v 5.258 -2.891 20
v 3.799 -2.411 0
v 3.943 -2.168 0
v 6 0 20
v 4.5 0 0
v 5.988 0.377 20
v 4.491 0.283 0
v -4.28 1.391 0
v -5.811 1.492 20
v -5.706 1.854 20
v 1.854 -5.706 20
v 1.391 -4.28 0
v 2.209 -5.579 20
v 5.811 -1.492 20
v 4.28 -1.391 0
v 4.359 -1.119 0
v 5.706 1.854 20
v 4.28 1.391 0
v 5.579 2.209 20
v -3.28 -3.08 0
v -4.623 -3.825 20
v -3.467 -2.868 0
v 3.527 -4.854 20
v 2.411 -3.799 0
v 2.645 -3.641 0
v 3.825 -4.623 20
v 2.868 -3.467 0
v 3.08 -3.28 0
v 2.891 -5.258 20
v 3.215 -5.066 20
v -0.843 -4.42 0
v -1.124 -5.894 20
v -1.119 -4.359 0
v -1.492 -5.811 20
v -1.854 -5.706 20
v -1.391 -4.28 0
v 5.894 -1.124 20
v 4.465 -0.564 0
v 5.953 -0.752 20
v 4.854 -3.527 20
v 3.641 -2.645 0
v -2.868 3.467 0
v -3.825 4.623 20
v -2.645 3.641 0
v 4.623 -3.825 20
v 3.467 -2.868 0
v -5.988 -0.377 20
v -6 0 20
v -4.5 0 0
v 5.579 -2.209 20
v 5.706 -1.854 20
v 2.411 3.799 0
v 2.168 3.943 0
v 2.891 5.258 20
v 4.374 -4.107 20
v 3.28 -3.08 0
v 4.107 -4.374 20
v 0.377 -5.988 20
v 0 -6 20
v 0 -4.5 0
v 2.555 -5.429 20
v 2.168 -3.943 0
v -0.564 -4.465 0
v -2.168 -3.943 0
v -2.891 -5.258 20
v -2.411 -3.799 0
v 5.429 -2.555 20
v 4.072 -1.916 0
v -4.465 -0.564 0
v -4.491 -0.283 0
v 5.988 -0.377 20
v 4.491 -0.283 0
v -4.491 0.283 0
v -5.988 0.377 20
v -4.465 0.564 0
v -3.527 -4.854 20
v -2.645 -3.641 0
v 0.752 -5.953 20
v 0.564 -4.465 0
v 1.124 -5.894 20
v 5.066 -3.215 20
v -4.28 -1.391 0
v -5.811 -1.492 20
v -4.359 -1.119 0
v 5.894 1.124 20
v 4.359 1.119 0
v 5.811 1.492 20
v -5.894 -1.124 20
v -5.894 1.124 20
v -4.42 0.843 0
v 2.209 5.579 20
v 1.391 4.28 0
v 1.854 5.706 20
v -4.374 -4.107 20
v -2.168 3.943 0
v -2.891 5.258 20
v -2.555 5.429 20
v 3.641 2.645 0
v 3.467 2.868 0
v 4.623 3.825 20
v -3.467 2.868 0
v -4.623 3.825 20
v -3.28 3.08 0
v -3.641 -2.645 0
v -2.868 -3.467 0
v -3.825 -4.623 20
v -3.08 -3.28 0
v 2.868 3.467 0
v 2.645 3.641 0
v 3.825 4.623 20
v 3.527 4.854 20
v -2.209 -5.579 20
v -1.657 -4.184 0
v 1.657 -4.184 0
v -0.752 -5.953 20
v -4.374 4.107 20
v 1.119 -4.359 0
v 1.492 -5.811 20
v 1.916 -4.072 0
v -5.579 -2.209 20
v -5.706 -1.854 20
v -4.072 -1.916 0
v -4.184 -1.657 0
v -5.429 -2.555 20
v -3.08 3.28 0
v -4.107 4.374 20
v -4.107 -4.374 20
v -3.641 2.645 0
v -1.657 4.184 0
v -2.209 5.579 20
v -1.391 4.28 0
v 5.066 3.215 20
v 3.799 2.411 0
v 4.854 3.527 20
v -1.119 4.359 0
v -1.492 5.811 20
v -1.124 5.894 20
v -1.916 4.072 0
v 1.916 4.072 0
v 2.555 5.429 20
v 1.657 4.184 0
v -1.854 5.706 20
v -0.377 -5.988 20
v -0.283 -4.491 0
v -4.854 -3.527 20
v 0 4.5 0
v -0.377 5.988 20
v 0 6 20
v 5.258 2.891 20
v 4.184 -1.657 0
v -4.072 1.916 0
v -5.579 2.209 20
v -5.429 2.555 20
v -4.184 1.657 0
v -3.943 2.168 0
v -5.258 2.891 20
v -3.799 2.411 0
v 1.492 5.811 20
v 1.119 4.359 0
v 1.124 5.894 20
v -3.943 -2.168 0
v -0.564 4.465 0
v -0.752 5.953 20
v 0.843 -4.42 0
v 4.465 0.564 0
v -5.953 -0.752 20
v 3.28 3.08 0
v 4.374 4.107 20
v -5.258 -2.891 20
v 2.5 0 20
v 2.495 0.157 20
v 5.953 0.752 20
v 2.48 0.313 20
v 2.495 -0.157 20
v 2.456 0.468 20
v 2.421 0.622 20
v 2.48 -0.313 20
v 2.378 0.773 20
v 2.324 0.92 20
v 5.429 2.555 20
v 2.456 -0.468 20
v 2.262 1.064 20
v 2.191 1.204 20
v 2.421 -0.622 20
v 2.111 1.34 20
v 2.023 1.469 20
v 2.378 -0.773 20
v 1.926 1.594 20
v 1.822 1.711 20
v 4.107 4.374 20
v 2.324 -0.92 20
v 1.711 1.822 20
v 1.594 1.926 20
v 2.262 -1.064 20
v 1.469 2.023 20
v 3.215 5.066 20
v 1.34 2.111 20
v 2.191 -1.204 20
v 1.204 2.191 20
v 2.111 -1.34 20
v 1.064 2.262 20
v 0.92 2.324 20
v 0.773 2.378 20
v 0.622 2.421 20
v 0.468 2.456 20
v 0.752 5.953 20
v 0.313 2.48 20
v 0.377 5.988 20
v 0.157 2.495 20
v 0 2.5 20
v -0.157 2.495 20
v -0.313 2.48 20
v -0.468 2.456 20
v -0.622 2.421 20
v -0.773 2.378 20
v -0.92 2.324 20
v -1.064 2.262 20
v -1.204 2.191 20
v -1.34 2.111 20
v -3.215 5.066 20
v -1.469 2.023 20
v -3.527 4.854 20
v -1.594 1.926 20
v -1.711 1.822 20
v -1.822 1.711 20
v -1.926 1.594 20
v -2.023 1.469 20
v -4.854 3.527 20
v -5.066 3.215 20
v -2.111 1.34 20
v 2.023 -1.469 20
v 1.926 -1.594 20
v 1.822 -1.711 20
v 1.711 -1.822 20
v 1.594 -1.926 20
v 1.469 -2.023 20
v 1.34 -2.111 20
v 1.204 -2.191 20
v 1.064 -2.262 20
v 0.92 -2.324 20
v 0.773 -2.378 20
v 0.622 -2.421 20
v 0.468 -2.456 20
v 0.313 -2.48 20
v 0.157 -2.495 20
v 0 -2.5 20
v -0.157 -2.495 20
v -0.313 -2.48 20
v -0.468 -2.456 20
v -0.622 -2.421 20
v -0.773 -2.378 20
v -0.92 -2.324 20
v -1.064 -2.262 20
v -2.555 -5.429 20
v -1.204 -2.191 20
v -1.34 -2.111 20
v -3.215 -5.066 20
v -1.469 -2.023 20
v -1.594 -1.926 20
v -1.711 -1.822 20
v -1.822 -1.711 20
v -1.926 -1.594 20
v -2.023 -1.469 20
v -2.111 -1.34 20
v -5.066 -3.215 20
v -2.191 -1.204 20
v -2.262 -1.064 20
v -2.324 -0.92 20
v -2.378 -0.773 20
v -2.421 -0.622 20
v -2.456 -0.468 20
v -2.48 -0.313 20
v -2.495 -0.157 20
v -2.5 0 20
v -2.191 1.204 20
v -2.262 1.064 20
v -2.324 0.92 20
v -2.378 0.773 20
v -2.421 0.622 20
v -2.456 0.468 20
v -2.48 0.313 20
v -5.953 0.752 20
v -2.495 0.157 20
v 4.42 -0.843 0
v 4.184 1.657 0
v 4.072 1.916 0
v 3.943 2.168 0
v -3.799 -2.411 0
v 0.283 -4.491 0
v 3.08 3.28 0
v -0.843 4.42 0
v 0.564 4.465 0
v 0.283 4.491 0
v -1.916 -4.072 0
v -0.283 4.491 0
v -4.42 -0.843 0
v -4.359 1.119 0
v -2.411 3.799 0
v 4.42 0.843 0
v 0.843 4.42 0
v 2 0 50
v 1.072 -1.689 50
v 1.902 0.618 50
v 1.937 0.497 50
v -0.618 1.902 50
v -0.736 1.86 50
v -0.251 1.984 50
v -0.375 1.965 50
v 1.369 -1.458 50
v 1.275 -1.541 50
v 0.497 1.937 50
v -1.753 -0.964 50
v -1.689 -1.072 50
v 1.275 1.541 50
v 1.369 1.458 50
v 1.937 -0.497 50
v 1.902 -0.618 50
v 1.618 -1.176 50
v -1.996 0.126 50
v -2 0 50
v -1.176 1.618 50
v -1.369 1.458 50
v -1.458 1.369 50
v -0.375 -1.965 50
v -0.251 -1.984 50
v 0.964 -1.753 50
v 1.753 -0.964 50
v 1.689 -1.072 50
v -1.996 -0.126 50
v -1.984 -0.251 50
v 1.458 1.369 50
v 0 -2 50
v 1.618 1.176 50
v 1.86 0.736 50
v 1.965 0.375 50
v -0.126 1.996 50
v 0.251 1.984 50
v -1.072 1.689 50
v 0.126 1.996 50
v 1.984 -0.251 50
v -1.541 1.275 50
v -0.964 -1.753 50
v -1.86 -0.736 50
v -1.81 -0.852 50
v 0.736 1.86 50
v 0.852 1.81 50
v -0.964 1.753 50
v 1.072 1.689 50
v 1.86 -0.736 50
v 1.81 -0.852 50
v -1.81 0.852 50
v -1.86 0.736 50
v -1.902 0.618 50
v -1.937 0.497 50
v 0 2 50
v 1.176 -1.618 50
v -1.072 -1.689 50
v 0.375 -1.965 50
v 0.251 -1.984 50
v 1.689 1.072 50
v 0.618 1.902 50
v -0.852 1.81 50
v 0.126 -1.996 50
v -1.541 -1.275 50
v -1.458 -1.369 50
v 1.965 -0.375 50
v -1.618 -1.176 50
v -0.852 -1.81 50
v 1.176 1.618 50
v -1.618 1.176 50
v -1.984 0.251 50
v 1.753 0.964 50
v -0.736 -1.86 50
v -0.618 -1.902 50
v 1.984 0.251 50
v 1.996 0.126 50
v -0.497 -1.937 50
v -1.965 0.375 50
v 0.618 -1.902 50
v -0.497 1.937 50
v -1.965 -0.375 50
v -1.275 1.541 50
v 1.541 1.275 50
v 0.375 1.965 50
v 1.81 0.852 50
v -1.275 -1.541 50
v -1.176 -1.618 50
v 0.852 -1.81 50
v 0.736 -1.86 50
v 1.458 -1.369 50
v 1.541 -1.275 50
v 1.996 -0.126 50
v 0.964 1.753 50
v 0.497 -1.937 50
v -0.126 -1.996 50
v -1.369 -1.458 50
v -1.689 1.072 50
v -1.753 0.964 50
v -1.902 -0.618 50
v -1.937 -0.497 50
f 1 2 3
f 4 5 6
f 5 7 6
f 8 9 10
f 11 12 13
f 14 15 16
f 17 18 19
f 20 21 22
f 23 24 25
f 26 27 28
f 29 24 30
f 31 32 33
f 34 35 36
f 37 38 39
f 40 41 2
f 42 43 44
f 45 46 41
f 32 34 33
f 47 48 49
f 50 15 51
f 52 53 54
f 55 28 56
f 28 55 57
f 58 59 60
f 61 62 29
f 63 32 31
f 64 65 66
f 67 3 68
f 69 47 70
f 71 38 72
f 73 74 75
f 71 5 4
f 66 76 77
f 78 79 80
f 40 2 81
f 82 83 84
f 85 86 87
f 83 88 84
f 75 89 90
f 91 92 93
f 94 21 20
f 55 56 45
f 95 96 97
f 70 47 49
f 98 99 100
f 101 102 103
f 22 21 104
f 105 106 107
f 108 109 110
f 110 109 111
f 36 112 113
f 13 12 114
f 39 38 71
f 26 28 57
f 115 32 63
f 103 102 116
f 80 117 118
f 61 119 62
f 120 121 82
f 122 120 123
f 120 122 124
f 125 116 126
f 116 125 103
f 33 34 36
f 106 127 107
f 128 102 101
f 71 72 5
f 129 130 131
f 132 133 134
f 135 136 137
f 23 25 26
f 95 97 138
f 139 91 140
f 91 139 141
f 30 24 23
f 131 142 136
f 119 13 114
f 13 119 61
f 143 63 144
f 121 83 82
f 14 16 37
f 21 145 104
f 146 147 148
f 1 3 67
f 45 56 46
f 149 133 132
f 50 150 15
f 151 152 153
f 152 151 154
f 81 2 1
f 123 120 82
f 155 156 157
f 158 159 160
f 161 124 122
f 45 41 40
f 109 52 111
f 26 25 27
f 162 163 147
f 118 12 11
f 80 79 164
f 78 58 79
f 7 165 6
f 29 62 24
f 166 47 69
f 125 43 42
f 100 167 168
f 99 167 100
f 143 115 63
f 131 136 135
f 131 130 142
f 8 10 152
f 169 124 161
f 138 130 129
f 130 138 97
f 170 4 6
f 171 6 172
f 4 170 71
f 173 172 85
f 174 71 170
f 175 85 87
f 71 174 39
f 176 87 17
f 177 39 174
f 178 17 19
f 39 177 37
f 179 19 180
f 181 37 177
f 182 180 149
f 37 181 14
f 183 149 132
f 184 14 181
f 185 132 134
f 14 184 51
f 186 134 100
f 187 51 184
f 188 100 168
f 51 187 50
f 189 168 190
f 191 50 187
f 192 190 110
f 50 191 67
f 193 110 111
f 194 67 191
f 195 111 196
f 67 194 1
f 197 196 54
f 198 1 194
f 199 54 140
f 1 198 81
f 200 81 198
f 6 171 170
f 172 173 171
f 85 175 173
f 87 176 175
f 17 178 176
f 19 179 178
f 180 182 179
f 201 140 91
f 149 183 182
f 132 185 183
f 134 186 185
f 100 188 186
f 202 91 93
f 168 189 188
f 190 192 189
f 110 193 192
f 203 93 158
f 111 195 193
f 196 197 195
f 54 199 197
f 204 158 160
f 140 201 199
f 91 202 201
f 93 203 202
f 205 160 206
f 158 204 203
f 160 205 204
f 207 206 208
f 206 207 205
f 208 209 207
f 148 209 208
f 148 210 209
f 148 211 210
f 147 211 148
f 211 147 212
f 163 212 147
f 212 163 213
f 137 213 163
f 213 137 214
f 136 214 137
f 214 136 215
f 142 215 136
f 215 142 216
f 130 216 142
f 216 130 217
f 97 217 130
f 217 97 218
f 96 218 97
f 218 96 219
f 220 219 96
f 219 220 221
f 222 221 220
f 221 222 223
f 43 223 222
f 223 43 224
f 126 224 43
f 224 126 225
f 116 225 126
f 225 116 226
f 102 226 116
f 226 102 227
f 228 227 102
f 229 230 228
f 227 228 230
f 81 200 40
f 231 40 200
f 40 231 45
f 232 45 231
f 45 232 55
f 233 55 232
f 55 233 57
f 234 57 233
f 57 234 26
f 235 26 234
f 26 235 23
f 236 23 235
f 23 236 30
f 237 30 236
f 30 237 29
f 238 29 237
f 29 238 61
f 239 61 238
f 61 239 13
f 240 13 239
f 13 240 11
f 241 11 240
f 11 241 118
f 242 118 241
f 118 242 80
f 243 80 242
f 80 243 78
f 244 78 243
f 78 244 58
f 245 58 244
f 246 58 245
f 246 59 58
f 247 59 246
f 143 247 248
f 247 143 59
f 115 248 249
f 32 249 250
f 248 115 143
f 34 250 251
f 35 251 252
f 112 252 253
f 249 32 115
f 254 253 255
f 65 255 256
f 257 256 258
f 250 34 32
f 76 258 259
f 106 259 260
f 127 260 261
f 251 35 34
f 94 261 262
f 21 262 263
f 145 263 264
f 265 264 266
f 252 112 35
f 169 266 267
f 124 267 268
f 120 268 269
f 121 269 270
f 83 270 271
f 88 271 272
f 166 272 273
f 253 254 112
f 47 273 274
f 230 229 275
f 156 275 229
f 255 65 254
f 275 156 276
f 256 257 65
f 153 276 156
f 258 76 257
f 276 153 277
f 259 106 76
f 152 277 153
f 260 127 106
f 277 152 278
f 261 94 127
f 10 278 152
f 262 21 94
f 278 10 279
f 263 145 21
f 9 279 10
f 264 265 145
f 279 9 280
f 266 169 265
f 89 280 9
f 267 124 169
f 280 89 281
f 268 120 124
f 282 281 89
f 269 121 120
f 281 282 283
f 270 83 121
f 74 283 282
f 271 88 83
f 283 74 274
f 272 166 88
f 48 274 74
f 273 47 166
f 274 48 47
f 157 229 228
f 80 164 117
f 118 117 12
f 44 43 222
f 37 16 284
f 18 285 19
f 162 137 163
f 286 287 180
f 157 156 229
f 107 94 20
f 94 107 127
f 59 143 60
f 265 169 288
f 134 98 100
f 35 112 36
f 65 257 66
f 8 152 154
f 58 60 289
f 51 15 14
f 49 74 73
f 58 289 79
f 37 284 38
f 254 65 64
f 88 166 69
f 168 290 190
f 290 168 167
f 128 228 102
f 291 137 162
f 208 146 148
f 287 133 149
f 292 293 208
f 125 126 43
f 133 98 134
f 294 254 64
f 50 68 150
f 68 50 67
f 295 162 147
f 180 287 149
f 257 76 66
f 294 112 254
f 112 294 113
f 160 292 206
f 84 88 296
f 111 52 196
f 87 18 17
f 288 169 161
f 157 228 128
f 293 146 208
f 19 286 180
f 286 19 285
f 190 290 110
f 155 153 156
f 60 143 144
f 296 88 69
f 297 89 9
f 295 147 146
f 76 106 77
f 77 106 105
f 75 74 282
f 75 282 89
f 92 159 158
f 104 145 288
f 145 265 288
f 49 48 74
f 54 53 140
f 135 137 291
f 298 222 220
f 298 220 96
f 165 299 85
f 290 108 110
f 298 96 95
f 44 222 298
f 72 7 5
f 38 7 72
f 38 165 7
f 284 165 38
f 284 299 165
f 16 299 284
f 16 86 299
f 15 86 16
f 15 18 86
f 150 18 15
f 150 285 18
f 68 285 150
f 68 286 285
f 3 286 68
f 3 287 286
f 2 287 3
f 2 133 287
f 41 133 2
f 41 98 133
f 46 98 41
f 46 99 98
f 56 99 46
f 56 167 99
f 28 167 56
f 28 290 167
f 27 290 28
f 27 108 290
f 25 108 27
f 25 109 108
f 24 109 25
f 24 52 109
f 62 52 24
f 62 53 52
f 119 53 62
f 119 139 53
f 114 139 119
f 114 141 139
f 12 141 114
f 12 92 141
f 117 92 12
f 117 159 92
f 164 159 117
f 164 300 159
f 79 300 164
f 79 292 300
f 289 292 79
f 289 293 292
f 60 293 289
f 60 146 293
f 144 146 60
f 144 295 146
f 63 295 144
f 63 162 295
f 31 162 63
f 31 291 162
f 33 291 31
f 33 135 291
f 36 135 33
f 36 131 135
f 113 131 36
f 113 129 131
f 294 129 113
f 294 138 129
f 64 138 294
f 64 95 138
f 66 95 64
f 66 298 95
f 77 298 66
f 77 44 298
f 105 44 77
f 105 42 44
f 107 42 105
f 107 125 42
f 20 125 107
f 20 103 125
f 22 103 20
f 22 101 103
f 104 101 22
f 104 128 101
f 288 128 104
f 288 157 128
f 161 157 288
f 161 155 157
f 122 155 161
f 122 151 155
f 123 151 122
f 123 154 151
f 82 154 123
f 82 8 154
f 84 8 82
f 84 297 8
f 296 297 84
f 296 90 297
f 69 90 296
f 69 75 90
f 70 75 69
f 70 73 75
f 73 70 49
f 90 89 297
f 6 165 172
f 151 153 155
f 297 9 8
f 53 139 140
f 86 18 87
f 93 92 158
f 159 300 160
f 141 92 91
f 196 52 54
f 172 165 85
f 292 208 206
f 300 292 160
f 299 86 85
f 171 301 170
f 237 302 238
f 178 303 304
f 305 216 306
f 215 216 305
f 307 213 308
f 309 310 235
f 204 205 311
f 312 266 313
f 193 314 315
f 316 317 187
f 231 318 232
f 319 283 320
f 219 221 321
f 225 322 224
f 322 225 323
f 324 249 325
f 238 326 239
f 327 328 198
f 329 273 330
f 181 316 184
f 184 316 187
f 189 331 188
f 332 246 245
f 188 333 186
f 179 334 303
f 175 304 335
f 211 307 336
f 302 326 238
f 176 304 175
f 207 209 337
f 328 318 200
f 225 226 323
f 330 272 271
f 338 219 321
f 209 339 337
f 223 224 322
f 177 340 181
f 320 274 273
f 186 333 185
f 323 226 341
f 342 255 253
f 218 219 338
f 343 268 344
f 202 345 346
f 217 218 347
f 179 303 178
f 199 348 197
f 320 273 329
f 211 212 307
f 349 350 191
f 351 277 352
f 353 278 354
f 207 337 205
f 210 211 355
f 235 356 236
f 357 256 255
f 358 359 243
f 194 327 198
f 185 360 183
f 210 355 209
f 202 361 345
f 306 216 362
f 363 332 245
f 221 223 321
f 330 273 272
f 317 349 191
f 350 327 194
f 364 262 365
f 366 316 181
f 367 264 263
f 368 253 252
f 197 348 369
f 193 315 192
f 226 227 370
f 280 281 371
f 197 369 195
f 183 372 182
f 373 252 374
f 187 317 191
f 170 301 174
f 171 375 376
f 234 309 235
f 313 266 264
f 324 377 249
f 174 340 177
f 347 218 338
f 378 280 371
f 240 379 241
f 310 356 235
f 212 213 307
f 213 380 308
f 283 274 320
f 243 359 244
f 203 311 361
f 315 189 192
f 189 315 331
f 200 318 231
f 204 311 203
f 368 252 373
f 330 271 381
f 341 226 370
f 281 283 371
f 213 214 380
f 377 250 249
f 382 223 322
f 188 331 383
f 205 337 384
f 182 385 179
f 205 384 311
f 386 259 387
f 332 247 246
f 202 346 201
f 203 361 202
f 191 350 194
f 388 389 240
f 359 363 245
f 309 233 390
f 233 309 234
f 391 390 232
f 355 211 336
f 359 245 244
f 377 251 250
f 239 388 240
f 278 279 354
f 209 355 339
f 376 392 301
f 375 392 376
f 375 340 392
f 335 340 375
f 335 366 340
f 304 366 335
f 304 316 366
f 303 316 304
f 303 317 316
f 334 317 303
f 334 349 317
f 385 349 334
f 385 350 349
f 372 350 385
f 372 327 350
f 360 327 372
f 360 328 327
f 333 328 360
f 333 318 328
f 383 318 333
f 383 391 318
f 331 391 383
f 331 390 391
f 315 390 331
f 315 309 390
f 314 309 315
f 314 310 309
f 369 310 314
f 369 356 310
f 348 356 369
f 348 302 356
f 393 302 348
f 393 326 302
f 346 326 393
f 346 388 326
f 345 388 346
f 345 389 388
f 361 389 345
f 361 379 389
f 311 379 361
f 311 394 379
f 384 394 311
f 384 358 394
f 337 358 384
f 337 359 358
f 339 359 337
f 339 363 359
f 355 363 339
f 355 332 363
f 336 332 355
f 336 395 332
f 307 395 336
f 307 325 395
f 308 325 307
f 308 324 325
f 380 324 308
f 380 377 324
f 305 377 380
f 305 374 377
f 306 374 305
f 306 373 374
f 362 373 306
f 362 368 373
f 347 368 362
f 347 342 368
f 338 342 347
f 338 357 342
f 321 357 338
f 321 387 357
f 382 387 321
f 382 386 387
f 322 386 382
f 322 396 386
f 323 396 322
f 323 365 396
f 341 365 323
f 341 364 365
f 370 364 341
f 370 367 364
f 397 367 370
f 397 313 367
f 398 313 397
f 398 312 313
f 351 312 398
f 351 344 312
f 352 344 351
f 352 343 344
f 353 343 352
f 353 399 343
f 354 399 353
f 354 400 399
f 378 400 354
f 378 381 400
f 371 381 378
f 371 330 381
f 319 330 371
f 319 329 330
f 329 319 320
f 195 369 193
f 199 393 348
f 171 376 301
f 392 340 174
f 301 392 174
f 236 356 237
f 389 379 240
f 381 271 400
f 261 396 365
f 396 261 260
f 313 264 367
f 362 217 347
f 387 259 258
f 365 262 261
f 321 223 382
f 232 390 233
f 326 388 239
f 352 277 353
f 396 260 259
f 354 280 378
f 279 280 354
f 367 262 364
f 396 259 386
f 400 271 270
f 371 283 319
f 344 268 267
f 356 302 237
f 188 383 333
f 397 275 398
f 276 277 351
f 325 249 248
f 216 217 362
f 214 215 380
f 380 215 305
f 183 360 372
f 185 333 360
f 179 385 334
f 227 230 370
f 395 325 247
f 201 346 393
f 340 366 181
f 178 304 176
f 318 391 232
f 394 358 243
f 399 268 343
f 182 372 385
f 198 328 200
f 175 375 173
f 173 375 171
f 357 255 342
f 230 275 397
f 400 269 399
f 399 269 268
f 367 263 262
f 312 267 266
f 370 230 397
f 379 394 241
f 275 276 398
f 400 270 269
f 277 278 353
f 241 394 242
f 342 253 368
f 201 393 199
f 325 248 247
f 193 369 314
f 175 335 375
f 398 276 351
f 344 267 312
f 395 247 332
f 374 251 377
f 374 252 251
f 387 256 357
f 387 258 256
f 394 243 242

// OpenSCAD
// file: ../library_deh/mag_mount.scad
/* mag_mount.scad

 * ****** Stud magnets ******
16 mm 
http://www.kjmagnetics.com/proddetail.asp?prod=MM-C-16
    Dimensions:
        D=16mm (0.63")
        M=4mm (0.16") (M4 Coarse Male threaded stud)
        H=13mm (0.51")
        h=5mm (0.20")
    Material: NdFeB, Grade N38
    Plating/Coating: Ni-Cu-Ni (Nickel)
    Magnetization Direction: Axial (Poles on Flat Ends)
    Weight: 0.26 oz. (7.37 g)
    Pull Force: 12.1 lbs
    Surface Field: N/A
    Brmax: 12,600 Gauss
    BHmax: 38 MGOe
   $2.49
*/
// Measured dimensions -- 16 mm ** M3 ** stud (default)
 mag_thick = 4.82;	    // Magnet thickness (base to shell top)
 mag_shell_dia = 16.0;	    // Magnet shell OD
 mag_shell_flat_dia = 11;   // Dia of flat of magnet
 mag_stud_dia = 2.8;        // Dia of mounting magnet studs (4-40)
 mag_stud_len = 8.0;        // Height of stud from magnet back
 mag_washer_thick = 1.1;    // Thickness of washer
 mag_nut_thick = 2.4;       // Stud nut (M3) thickness
 mag_nut_hex_flat = 5.41;   // Nut across flats
 mag_nut_hex_peak = 6.20;   // Nut across peaks (also dia of nut)
 mag_washer_dia = 7.1; // 9.5;// Diameter of washer for magnet stud
 mag_washer_dia_extra = 2;  // Washer slop

// Measured dimensions 16 mm -- ** M4 ** stud
 mag16_M4_thick = 5.21;	     // Magnet thickness (base to shell top)
 mag16_M4_shell_dia = 16.0;	     // Magnet shell OD
 mag16_M4_shell_flat_dia = 11.7;  // Dia of flat of magnet
 mag16_M4_stud_dia = 3.64;        // Dia of mounting magnet studs (M4)
 mag16_M4_stud_len = 8.18;        // Height of stud from magnet back
 mag16_M4_nut_thick = 2.98;       // Stud nut (M4) thickness
 mag16_M4_nut_hex_flat = 6.85;    // Nut across flats
 mag16_M4_nut_hex_peak = 7.89;    // Nut across peaks (also dia of nut)
 mag16_M4_washer_thick = 0.85;    // Thickness of washer
 mag16_M4_washer_dia = 8.68;      // Diameter of washer for magnet stud
 mag16_M4_washer_inner_dia = 5.3; // Washer hole diameter
 mag16_M4_washer_dia_extra = 0.5; // Washer slop


/*
http://www.kjmagnetics.com/proddetail.asp?prod=MM-C-20
    Dimensions:
        D=20mm (0.79")
        M=4mm (0.16") (M4 Coarse Male threaded stud)
        H=15mm (0.59")
        h=7mm (0.28")
    Material: NdFeB, Grade N38
    Plating/Coating: Ni-Cu-Ni (Nickel)
    Magnetization Direction: Axial (Poles on Flat Ends)
    Weight: 0.53 oz. (15.0 g)
    Pull Force: 28.7 lbs
    Surface Field: N/A
    Brmax: 12,600 Gauss
    BHmax: 38 MGOe

  $3.14
*/
 mag20_thick = 7.11;	       // Magnet thickness (base to shell top)
 mag20_shell_flat_dia = 20.2;  // Magnet shell OD
 mag20_stud_dia = 3.75;        // Dia of mounting magnet stud at base
 mag20_stud_len = 7.75;        // Height of stud from magnet back
 mag20_washer_thick = 0.85;    // Thickness of washer
 mag20_nut_thick = 2.93;       // Nut for stud thickness
 mag20_nut_hex_peak = 7.89; // Nut across peaks (also dia of nut)
 mag20_washer_dia = 8.68;      // Diameter of washer for magnet stud
 mag20_washer_dia_extra = 0.5; // Washer slop

/*
http://www.kjmagnetics.com/proddetail.asp?prod=MM-C-25

    Dimensions:
        D=25mm (0.98")
        M=5mm (0.20") (M5 Coarse Male threaded stud)
        H=17mm (0.67")
        h=8mm (0.32")
    Material: NdFeB, Grade N38
    Plating/Coating: Ni-Cu-Ni (Nickel)
    Magnetization Direction: Axial (Poles on Flat Ends)
    Weight: 0.92 oz. (26.1 g)
    Pull Force: 48.5 lbs
    Surface Field: N/A
    Brmax: 12,600 Gauss
    BHmax: 38 MGOe
  $4.20
*/
// 25 mm M5
 mag25_thick = 7.75;	      // Magnet thickness (base to shell top)
 mag25_shell_dia = 25.17;     // Magnet shell OD
 mag25_shell_flat_dia = 20;   // Dia of flat of magent
 mag25_stud_dia = 4.82;       // Dia of mounting magnet studs (M5)
 mag25_stud_len = 9.3;        // Height of stud from magnet back
 mag25_washer_thick = 0.97;   // Thickness of washer
 mag25_nut_thick = 3.96;      // M5 Nut for stud thickness
 mag25_nut_hex_flat = 7.93;   // M5 nut across flats
 mag25_nut_hex_peak = 9.16;   // M5 nut across peaks (also dia of nut)
 mag25_washer_dia = 9.8;      // Washer diameter of washer for magnet stud
 mag25_washer_inner_dia = 5.3;// Washer hole diameter
 mag25_washer_dia_extra = 0.5;  // Washer slop

// Cylindrical magnets
mag_cyl_dia = 6.5; 
mag_cyl_ht = 5.05;
// file: ../library_deh/ridged_screw_hole.scad
/*
file: ridged_screw_hole.scad
2018 01 18
*/
/*
All results are translated so that inside edges of the ridges are aligned with the axis, so a 
square or rectangle will have the corner centered on the x,y origin.

Modules----
module ridged_rectangle(xlen,ylen,zlen,rht,rwdy)
module corner_ridged_rectangle(xlen,ylen,zlen,rht,rwdx,rwdy)
module corner_ridged_square(slen,zlen,rht,rwds)
module corner_ridged_square_w_screw(slen,zlen,rht,rwds,scd1,scd2,sch,scofx,scofy)
module corner_ridged_rectangle_w_screw(xlen,ylen,zlen,rht,rwdx,rwdy,scd1,scd2,sch,scofx,scofy)
module ridged_rectangular_w_clip(xlen,ylen,zlen,rht,rwdy,clen)
*/

include <deh_shapes.scad>

/*  ***** ridged_rectangle *****
* xlen = x axis direction length
* ylen = y axis direction length
* zlen = z axis, height to ledge
* rht  = ridge thickness
* rwdy = ridge width, y direction
* NOTE: to convert from right orientation use
* mirror([1,0,0]) for left orientation
*/
module ridged_rectangle(xlen,ylen,zlen,rht,rwdy)
{
	corner_ridged_rectangle(xlen,ylen,zlen,rht,0,rwdy);
}

/*  ***** corner_ridged_rectangle *****
* xlen = x axis direction length
* ylen = y axis direction length
* zlen = z axis, height to ledge
* rht  = ridge thickness
* rwdx = ridge width, x direction
* rwdy = ridge width, y direction
*/
module corner_ridged_rectangle(xlen,ylen,zlen,rht,rwdx,rwdy)
{
    cx = rwdx; cy = -rwdy;
    translate([-cx,cy,0])
    {
        difference()
        {
            union()
            {
                zht1 = (zlen+rht);
                cube([xlen,ylen,zht1],center=false);
            }
            union()
            {
                zht2 = rht+0.1;
                translate([rwdx,rwdy,zlen])
                    cube([xlen,ylen,zht2],center=false);
            }
        }
    }        
}

/*  ***** corner_ridged_square_w_screw *****
* slen = length x & y axis directions
* zlen = z axis, height to ledge
* rht  = ridge thickness
* rwds = ridge width, x & y directions
*/
module corner_ridged_square(slen,zlen,rht,rwds)
{
    corner_ridged_rectangle(slen,slen,zlen,rht,rwds,rwds);
}

/*  ***** corner_ridged_square_w_screw *****
* slen = length x & y axis directions
* zlen = z axis, height to ledge
* rht  = ridge thickness
* rwds = ridge width, x & y directions
* scd1 = screw diameter at top
* scd2 = screw diameter at bottom of screw
* sch  = screw hole height
* scofx = screw hole center offset from inside ridge corner, x
* scofy = screw hole center offset from inside ridge corner, y
*/
        //corner_ridged_square_w_screw(  10,  5, 1.5,  4,  3.2,  1.2,  3,  -1.4,  -1.4  ); // test
module corner_ridged_square_w_screw(slen,zlen,rht,rwds,scd1,scd2,sch,scofx,scofy)
{
    difference()
    {
        corner_ridged_square(slen,zlen,rht,rwds);
        
        translate([0,0,zlen-sch+rht+.01])
            ridge_screw_hole_square(slen,rwds,rwds,scd1,scd2,sch,scofx,scofy);
    }
}

/*  ***** corner_ridged_rectangle_w_screw *****
* xlen = x axis direction length
* ylen = y axis direction length
* zlen = z axis, height to ledge
* rht  = ridge thickness
* rwdx = ridge width, x directions
* rwdy = ridge width, y directions
* scd1 = screw diameter at top
* scd2 = screw diameter at bottom of screw
* sch  = screw hole height
* scofx = screw hole center offset from inside ridge corner, x
* scofy = screw hole center offset from inside ridge corner, y
*/
//translate([20,0,0])
//                                xlen ylen zlen rht dx dy   scd1 scd2  sch  scofx scofy
//corner_ridged_rectangle_w_screw(6,  12,    5, 1.5, 5, 4,    3.2, 2.2,   4,  -1.5,  -2.0); // Test right
//translate([-6,0,0])
//corner_ridged_rectangle_w_screw(6,  12,    5, 1.5, -3, 4,    3.2, 2.2,   4,  -1.5+6,  -2.0); // Test left
module corner_ridged_rectangle_w_screw(xlen,ylen,zlen,rht,rwdx,rwdy,scd1,scd2,sch,scofx,scofy)
{
    difference()
    {
        corner_ridged_rectangle(xlen,ylen,zlen,rht,rwdx,rwdy);
        
        translate([0,0,zlen-sch+rht+.01])
            ridge_screw_hole_rectangle(xlen,ylen,rwdx,rwdy,scd1,scd2,sch,scofx,scofy);
    }
}
/*
* xlen = x axis direction length
* ylen = y axis direction length
* rwdx = ridge width, x directions
* rwdy = ridge width, y directions
* scd1 = screw diameter at top
* scd2 = screw diameter at bottom of screw
* sch  = screw hole height
* scofx = screw hole center offset, x
* scofy = screw hole center offset, y
*/
module ridge_screw_hole_rectangle(xlen,ylen,rwdx,rwdy,scd1,scd2,sch,scofx,scofy)
{
    hx =  scofx;
    hy =   scofy;
//echo("ridge_screw_hole_rectangle","rwdx",rwdx,"rwdy",rwdy);
//echo("ridge_screw_hole_rectangle","scofx",scofx,"scofy",scofy,"hy",hy,"hx",hx);
//echo ("ridge_screw_hole_rectangle",sch);
    translate([hx,hy,0])
        cylinder(d1=scd2,d2=scd1,h=sch,center=false,$fn=25);    
}

module ridge_screw_hole_square(slen,rwdx,rwdy,scd1,scd2,sch,scofx,scofy)
{
    ridge_screw_hole_rectangle(slen,slen,rwdx,rwdy,scd1,scd2,sch,scofx,scofy);
}

/*
pst_ldg = 6 + bfthick;	// Height of pc board ledge from bottom
pst_wid = 3;	// Width of post
pcb_thick = 2.0;	// Thickness of pcb
clip_ht = 3;
pst_w2 = 1;	// Width where pcb contacts edge
*/

/*  ***** ridged_rectangular_w_clip *****
* xlen = x axis direction length
* ylen = y axis direction length
* zlen = z axis, height to ledge
* rht  = height of ridge (pcb thickness)
* rwdy = ridge width, y direction
* clen = clip length
* Orientation: ridge runs in y-axis direction 
* Note: ledge with is (xlen - rwdy)
*/
//         ridged_rectangular_w_clip(  3,  15,   5, 1.5, 1,   3 );	// Test
module ridged_rectangular_w_clip(xlen,ylen,zlen,rht,rwdy,clen)
{
	corner_ridged_rectangle(xlen,ylen,zlen,rht,rwdy,0);

	// Clip overhang
	cofsx = clen - rwdy;	// Offsets for wedge
 	cofsy = ylen;
	cofsz = zlen+rht+clen - rwdy;
	translate([cofsx,cofsy,cofsz])
		rotate([0,180,0])
		rotate([0,0,-90])
		wedge(ylen,clen,clen);

}
// file: ../library_deh/fasteners.scad
/* ***** fasteners.scad *****
 * library of measurements of 
 *   screws, washers, etc.
 * date: 20170512
*/

// 6-32
screw_dia_s632 = 3.35;	// shaft diameter
screw_dia_ph632 = 6.62;	// pan-head diameter
screw_dia_pht632 = 2.2;	// pan-head thickness
nut_dia_632 = 8.77 ;	// peak-peak 
nut_thick_632 = 2.77;	// thickess

// 4-40
screw_dia_s440 = 2.72;	// shaft diameter
screw_dia_s440_z = 1.90; // Dia at tip
screw_dia_ph = 5.42;	// pan-head diamter
screw_dia_pht = 1.7;	// pan-head thickness
nut_dia_440 =  7.12;	// peak-peak
nut_thick_440 = 2.41;	// thickess
nut_dia_440L = 8.88;	// Lock nut diameter
nut_thick_440L = 4.6;	// Lock nut thickness

// 6-20 self-tap
screw_dia_sod620 = 3.5;	// Outer diameter of threads
screw_dia_sth620 = 2.6;	// Self tap hole
screw_dia_pht = 6.7;	// pan-head diameter

// #4
washer_od_4 = 8.0;		// Washer outer diameter
washer_id_4 = 3.2;		// Washer inner diameter
washer_thick_4 = .94;	// Washer thickness

// #6
washer_od_6 = 9.46;	// Washer outer diameter	
washer_id_6 = 4.04;	// Washer inner diameter
washer_thick = 1.04;	// Washer thickness
washer_thick_6 = 1.04;	// Washer thickness

// M3
nut_dia_M3 = 6.5; 
nut_flat_M3 = 5.43;
nut_thick_M3 = 2.29;
washer_od_M3 = 6.9;	// Washer outside diameter
washer_id_M3 = 3.22;	// Washer inside (hole) diameter
washer_thick_M3 = .57;	// Washer thickness

// M4
nut_dia_M4 = 7.86;
nut_flat_M4 = 6.75;
nut_thick_M4 = 2.96;

// #2 6 self drilling Philips Screw (MSC: 124751)
screw_dia1_ss6 = 3.5;	// Self-tapping: dia at threads
screw_dia2_ss6 = 2.8;	// Self-tapping: dia at drilling end
screw_dia_he_ss6 = 6.7;	// Self-tapping: dia of pan head
// file: ../library_deh/Plano_frame.scad
/* File: Plano_frame.scad
 * Plano enclosure PC board fame
 * Author: deh
 * Latest edit: 201700701
 */

include <mag_mount.scad>

 $fn=100;
 
 // Inside dimensions of Plano box
 plano_len          = 152.5;   // flat-flat
 plano_wid          =  76.0;   // flat-flat

base_len = plano_len;
base_wid = plano_wid;
base_ht  = 3.2;		// Thickness of base plate
base_rnd = 10;	// Base plate corner rounding radius
 
 // Stud magnet relative postions.
 // Bottom magnet is on center-line and x,y reference is 0,0
 plano_mag_top_x  = 30.5;   // Top pair x +/- from center-line (C/L)
 plano_mag_top_y  = 138.69; // Top pair y from bottom magnet hole
 plano_mag_top_ofs = 8;    // Top mags to top edge of PC board max
 // Bottom mag distance from bottom of plano wall
 plano_mag_bot_ofs = plano_len - plano_mag_top_ofs - plano_mag_top_y;
 
 
 plano_offs_mag_y   = 4;    // Offset from edge for magnet hole
 plano_offs_mag_x   = 4;    // Offset from edge for magnet hole
 plano_ctr_y    = (plano_len/2);
 plano_ctr_x    = (plano_wid/2);
  
 plano_mag_stud = mag_stud_dia;  // Dia of mounting magnet studs (4-40)
 plano_mag_stud_len = mag_stud_len; // Height of stud from magnet back
 mag_washer_dia = 9.5;      // Diameter of washer for magnet stud
 mag_washer_thick = 1.1;    // Thickness of washer
 mag_washer_dia_extra = 1;  // Washer slop
 plano_web_thick = 2;   // Plano box thickness where stud is 
 mag_wash_recess_dia = mag_washer_dia + mag_washer_dia_extra;

 // Thickness of base for washer recess
 mag_stud_z = (mag_washer_thick +mag_nut_thick + plano_web_thick);
 mag_wash_recess_z = plano_mag_stud_len - mag_stud_z;    

 // Diameter of recess
 mag_wash_recess_dia = mag_washer_dia + mag_washer_dia_extra;

 // POD board
 pod_wid = 76.0;  // Overall width
 pod_len = 89.4;  // Overall length

// Discovery board
 dis_wid = 65.4;  // Overall width
 dis_len = 95.8;  // Overall length
 
// RJ45 connector on POD board
 RJ_offset=24.8; // Side of RJ45 jack from edge
 RJ_wid=15;      // Width of RJ 45 jack
 RJ_depth=14.5;  // Bottom of POD pc board edge to bottom/back of RJ45
 RJ_length=14;  // Front-Back length

// Cutout in base for RJ45 with plug
 RJ_slop = 4;
 RJ_plug_len = 14; // RJ plug protrudes beyond jack
 RJ_cutout_width = RJ_wid + RJ_slop;
 RJ_cutout_length = RJ_length + RJ_slop + RJ_plug_len;
 RJ_cutout_ofs = pod_wid/2 - (RJ_offset + RJ_wid);
 
 // CAN sub-board module
 sub_wid      = 33.75;  // Overall width
 sub_len      = 62.9;   // Overall lengh
 sub_mtg_wid  = 26.6;   // Between mounting holes, width
 sub_mtg_len  = 57.0;   // Between mounting holes, length 

 // Switcher module
 sw_wid =   20.3;   // Overall width
 sw_len =   41.2;   // Overall length
 sw_mtg_off_out_y   = 5.56; // Offset from edge "out" mounting hole 
 sw_mtg_off_out_x   = 2.7;  // Offset from edge "out" mounting hole 
 sw_mtg_off_in_y    = 3.1;  // Offset from edge "in" mounting hole
 sw_mtg_off_in_x    = 6.0;  // Offset from edge "in" mounting hole
 
 // RJ jack (load-cell jack)
 rj_grv =  4.0;  // Groove Depth 
 rj_ht  = 14.2;  // Groove Length
 rj_wid = 14.2;  // Groove Height
 
 // Post ridge
 p_ridge = 1.5; // Height of ridge to position PC board on post
 p_offset = 2;  // Offset of ridge from edge of post
 
 // Pod post
 pod_post_ht = (RJ_depth + 1);
 pod_post_y = 9;    // Length in "y" (long/length) box direction)
 pod_post_x = 6;    // Length in "x" (short/width) box direction)
 pod_post_q = 2.0;  // Width of ridge
 pod_post_s = 2.5;    // Screw hole dia
 pod_post_sd = 5;   // Screw hole depth

 // Pod board clip
 pcwide = 4;        // Width of clip post
 pcleng = 50;       // X axis direction length
 pc_y = base_len;   // y positioning

 iso_len   = 50.2;	// Length: two RJ 45 jacks parallel
 iso_wid   = 46.3;      // Width
 iso_thick = 1.6;	// PC board thickness
 iso_slop  = 0.0;	// Allowance for board variation
 iso_lip   = 1.2;	// Ledge width for board seating
 iso_ridge_ht = 1.55;	// Ridge ht for seat
 iso_ridge_wid= 1.5;	// Ridge width for seat
 iso_post_ht = 3.6;//6.0;	// Height of lip above base

 iso_osd_y = iso_wid + iso_slop - 0.5; // Board y
 iso_osd_x = iso_len + iso_slop - 0.5; // Board x
 iso_side  = iso_lip + iso_ridge_wid;
// file: ../library_deh/deh_shapes.scad
/* **** deh_shapes.scad *****
   * Library of useful shapes
   * 20170512
*/

/*  ***** tubedeh *****
d1 = outside diameter
d2 = inside diameter
ht = height
module tubedeh(d1,d2,ht)
reference is center of tube, bottom
*/

module tubedeh(d1,d2,ht)
{
   difference()
   {
     cylinder(d = d1, h = ht, center = false);
     cylinder(d = d2, h = ht + .001, center = false);
   }
}
/* ***** rounded_bar *****
 * rectangular bar with rounded end
bar with one end rounded
rounded_bar(d, l, h)
d = diameter of rounded end, and width of bar
l = length of bar from center of rounded end to end
h = thickness (height) of bar
reference is center of rounded end, bottom
*/
module rounded_bar(d, l, h)
{
    // Rounded end
    cylinder(d = d, h = h, center = false);
    // Bar
    translate([0, -d/2, 0])
       cube([l, d, h],false);
}
/* ***** eyebar *****
 * rounded bar with hole in rounded end
 * module eye_bar(d1, d2, len, ht)
d1 = outside diameter of rounded end, and width of bar
d2 = diameter of hole in end of bar
eye_bar(d1, d2, len, ht);
*/
module eye_bar(d1, d2, len, ht)
{
   difference()
   {   
      rounded_bar(d1,len,ht);
      cylinder(d = d2, h = ht + .001, center = false);
   }
}
/* ***** rounded_rectangle ******
rounded_rectangle(l,w,h,rad);
l = length (x direction)
w = width (y direction)
h = thickness (z direction)
rad = radius of corners
reference = center of rectangle x,y, bottom
*/
module rounded_rectangle(l,w,h,rad)
{
  translate([-(l-rad)/2,-(w-rad)/2,0])
  {
    // Four rounded edges
    translate([0,0,0])
      rounded_bar(rad*2,l-rad,h);
    translate([l-rad,0,0])
      rotate([0,0,90])
      rounded_bar(rad*2,w-rad,h);
    translate([l-rad,w-rad,0])
      rotate([0,0,180])
      rounded_bar(rad*2,l-rad,h);
    translate([0,w-rad,0])
      rotate([0,0,-90])
      rounded_bar(rad*2,w-rad,h);
    // Fill in center
    translate([0,0,0])
      cube([l-rad + .01,w-rad + .01,h],false);
  }
}

/* ***** rounded rim *****
module rounded_rim(l,w,h,rad,tk);
l = length (inside, x direction)
w = width (inside, y direction)
h = thickness (z direction)
rad = radius of corners
tk = thickness of rim wall
*/
module rounded_rim(l,w,h,rad,tk)
{
  difference()
  {
    rounded_rectangle(l+2*tk,w+2*tk,h,rad);
    rounded_rectangle(l, w, h, rad);
  }
}

/* ***** wedge *****
 * l = length
 * w = width
 * h = height/thickness
 * wedge(l, w, h)
*/
 module wedge(l, w, h)
 {
   polyhedron(
      points=[[0,0,0], [l,0,0], [l,w,0], [0,w,0], [0,w,h], [l,w,h]],
       faces=[[0,1,2,3],[5,4,3,2],[0,4,5,1],[0,3,4],[5,2,1]] );
 }
/* **** wedge_isoceles) ****
 * l - z axis length
 * w - y axis length 
 * h - x axis length
 * reference: [0, w/2, 0]
 * wedge_isoceles(l, w, h);
 */

module wedge_isoceles(l, w, h)
 {
  translate([0,0,l])
   rotate([0,90,0])
    translate([0,-w/2,0])
     polyhedron(
      points=[[0,0,0], [l,0,0], [l,w,0], [0,w,0], [0,w/2,h], [l,w/2,h]],
       faces=[[0,1,2,3],[5,4,3,2],[0,4,5,1],[0,3,4],[5,2,1]] );
 }
/* ***** rounded_triangle *****
 * l1 = side 1
 * l2 = side 2
 * l3 = side 3
 * h  = height/thickness
 * rad = radius of rounded corners
 */
module rounded_triangle(l1,l2,l3,h,rad)
{
  // Compute rotation angles
  al3 = acos((l1*l1 + l2*l2 - l3*l3)/(2 * l1 * l2));
  al1 = acos((l2*l2 + l3*l3 - l1*l1)/(2 * l2 * l3));
  al2 = acos((l3*l3 + l1*l1 - l2*l2)/(2 * l3 * l1));
  // Setup bars for edges
  translate([0,0,0])
    rotate([0,0,0])
      rounded_bar(rad,l3,h);
  translate([l3,0,0])
    rotate([0,0,180-al2])
      rounded_bar(rad,l1,h);
  rotate([0,0,al1])
    translate([l2,0,0])
      rotate([0,0,180])
        rounded_bar(rad,l2,h);
  // Fill in center
    triangle(l1,l2,l3,h);
}
/* ***** triangle *****
 * l1 = side 1
 * l2 = side 2
 * l3 = side 3
 * h  = height/thickness
 * triangle(l1,l2,l3,h);
 */
module triangle(l1,l2,l3,h)
{
  // Compute rotation angle
  al1 = acos((l2*l2 + l3*l3 - l1*l1)/(2 * l2 * l3));
  
  linear_extrude(height = h)
  polygon(points = [[0,0],[l3,0],[l2*cos(al1),l2*sin(al1)]]);
}
/* ***** chamfered hole *****
 * Punch hole with chamfer on one end
 * d1 = main hole diameter
 * d2 = hole diameter at chamfered end
 * ht1 = height of whole hole
 * ht2 = depth of  chamfer
*/
module chamfered_hole(d1,d2,ht1,ht2)
{
   rotate_extrude(convexity = 10)
     polygon(points = [[0,0],[d1/2,0],[d1/2,ht1-ht2],[d2/2,ht1],[0,ht1]]);

}

/* ***** fillet *****
 * r = radius of fillet
 * l = length of fillet
 fillet (r,l);
*/
module fillet(r,l)
{
   difference()
   {
     union()
     {
       cube([2*r,2*r,l]);
     }
     union()
     {
       translate ([r,r,0])
           cylinder(d = 2*r + 0.1, h = l, center = false);
       translate([r,0,0])
           cube([r,2*r,l],center = false);
       translate([0,r,0])
           cube([2*r,r,l],center = false);
     }
   }
}
/* ***** circular chamfer *****
 * d = outer diameter
 * rad = chamfer radius
 * circular_chamfer(d, rad);
*/
module circular_chamfer(d, rad)
{
  ofs = (d/2 - rad);
  rotate_extrude()
  translate([ofs,0])
   difference()
   {
     union()
     {
       square(size = [rad, rad]);
     }
     union()
     {
       translate ([0,rad ])
           circle(d = 2*rad + 0.1);
     }
   }
}
module circular_inner_chamfer(d, rad)
{
  circular_chamfer(d, rad);
} 

/* ***** circular chamfer *****
 * d = inner diameter
 * rad = chamfer radius
 * circular_chamfer(d, rad);
*/
module circular_outer_chamfer(d, rad)
{
  ofs = (d/2 - rad);
  rotate_extrude()
  translate([ofs,0])
   difference()
   {
     union()
     {
       square(size = [rad, rad]);
     }
     union()
     {
       translate ([rad,rad ])
           circle(d = 2*rad + 0.1);
     }
   }
}
// main file
/* File: airxplugS.scad
 * Plug for air-conditioner drain--Solid
 * Author: deh
 * Latest edit: 20180603
 * 
 */

include <../library_deh/deh_shapes.scad>
include <../library_deh/Plano_frame.scad>
include <../library_deh/fasteners.scad>
include <../library_deh/ridged_screw_hole.scad>

 $fn=100;

plg_ht = 20;
plg_d1 = 9;
plg_d2 = 12.0;
tub_d1 = 5.0;
tub_d2 = 4.0;
tub_ht = 30;
hole_dia = 4.5;

module plug_tube()
{
	difference()
	{
		union()
		{
			cylinder(d1=plg_d1,d2=plg_d2,h=plg_ht,center=false);

			translate([0,0,plg_ht])
				cylinder(d1=tub_d1,d2=tub_d2,h=tub_ht,center=false);
		}
		union()
		{
//			cylinder(d=hole_dia,h=100,center=false);
		}
	}
}
plug_tube();
